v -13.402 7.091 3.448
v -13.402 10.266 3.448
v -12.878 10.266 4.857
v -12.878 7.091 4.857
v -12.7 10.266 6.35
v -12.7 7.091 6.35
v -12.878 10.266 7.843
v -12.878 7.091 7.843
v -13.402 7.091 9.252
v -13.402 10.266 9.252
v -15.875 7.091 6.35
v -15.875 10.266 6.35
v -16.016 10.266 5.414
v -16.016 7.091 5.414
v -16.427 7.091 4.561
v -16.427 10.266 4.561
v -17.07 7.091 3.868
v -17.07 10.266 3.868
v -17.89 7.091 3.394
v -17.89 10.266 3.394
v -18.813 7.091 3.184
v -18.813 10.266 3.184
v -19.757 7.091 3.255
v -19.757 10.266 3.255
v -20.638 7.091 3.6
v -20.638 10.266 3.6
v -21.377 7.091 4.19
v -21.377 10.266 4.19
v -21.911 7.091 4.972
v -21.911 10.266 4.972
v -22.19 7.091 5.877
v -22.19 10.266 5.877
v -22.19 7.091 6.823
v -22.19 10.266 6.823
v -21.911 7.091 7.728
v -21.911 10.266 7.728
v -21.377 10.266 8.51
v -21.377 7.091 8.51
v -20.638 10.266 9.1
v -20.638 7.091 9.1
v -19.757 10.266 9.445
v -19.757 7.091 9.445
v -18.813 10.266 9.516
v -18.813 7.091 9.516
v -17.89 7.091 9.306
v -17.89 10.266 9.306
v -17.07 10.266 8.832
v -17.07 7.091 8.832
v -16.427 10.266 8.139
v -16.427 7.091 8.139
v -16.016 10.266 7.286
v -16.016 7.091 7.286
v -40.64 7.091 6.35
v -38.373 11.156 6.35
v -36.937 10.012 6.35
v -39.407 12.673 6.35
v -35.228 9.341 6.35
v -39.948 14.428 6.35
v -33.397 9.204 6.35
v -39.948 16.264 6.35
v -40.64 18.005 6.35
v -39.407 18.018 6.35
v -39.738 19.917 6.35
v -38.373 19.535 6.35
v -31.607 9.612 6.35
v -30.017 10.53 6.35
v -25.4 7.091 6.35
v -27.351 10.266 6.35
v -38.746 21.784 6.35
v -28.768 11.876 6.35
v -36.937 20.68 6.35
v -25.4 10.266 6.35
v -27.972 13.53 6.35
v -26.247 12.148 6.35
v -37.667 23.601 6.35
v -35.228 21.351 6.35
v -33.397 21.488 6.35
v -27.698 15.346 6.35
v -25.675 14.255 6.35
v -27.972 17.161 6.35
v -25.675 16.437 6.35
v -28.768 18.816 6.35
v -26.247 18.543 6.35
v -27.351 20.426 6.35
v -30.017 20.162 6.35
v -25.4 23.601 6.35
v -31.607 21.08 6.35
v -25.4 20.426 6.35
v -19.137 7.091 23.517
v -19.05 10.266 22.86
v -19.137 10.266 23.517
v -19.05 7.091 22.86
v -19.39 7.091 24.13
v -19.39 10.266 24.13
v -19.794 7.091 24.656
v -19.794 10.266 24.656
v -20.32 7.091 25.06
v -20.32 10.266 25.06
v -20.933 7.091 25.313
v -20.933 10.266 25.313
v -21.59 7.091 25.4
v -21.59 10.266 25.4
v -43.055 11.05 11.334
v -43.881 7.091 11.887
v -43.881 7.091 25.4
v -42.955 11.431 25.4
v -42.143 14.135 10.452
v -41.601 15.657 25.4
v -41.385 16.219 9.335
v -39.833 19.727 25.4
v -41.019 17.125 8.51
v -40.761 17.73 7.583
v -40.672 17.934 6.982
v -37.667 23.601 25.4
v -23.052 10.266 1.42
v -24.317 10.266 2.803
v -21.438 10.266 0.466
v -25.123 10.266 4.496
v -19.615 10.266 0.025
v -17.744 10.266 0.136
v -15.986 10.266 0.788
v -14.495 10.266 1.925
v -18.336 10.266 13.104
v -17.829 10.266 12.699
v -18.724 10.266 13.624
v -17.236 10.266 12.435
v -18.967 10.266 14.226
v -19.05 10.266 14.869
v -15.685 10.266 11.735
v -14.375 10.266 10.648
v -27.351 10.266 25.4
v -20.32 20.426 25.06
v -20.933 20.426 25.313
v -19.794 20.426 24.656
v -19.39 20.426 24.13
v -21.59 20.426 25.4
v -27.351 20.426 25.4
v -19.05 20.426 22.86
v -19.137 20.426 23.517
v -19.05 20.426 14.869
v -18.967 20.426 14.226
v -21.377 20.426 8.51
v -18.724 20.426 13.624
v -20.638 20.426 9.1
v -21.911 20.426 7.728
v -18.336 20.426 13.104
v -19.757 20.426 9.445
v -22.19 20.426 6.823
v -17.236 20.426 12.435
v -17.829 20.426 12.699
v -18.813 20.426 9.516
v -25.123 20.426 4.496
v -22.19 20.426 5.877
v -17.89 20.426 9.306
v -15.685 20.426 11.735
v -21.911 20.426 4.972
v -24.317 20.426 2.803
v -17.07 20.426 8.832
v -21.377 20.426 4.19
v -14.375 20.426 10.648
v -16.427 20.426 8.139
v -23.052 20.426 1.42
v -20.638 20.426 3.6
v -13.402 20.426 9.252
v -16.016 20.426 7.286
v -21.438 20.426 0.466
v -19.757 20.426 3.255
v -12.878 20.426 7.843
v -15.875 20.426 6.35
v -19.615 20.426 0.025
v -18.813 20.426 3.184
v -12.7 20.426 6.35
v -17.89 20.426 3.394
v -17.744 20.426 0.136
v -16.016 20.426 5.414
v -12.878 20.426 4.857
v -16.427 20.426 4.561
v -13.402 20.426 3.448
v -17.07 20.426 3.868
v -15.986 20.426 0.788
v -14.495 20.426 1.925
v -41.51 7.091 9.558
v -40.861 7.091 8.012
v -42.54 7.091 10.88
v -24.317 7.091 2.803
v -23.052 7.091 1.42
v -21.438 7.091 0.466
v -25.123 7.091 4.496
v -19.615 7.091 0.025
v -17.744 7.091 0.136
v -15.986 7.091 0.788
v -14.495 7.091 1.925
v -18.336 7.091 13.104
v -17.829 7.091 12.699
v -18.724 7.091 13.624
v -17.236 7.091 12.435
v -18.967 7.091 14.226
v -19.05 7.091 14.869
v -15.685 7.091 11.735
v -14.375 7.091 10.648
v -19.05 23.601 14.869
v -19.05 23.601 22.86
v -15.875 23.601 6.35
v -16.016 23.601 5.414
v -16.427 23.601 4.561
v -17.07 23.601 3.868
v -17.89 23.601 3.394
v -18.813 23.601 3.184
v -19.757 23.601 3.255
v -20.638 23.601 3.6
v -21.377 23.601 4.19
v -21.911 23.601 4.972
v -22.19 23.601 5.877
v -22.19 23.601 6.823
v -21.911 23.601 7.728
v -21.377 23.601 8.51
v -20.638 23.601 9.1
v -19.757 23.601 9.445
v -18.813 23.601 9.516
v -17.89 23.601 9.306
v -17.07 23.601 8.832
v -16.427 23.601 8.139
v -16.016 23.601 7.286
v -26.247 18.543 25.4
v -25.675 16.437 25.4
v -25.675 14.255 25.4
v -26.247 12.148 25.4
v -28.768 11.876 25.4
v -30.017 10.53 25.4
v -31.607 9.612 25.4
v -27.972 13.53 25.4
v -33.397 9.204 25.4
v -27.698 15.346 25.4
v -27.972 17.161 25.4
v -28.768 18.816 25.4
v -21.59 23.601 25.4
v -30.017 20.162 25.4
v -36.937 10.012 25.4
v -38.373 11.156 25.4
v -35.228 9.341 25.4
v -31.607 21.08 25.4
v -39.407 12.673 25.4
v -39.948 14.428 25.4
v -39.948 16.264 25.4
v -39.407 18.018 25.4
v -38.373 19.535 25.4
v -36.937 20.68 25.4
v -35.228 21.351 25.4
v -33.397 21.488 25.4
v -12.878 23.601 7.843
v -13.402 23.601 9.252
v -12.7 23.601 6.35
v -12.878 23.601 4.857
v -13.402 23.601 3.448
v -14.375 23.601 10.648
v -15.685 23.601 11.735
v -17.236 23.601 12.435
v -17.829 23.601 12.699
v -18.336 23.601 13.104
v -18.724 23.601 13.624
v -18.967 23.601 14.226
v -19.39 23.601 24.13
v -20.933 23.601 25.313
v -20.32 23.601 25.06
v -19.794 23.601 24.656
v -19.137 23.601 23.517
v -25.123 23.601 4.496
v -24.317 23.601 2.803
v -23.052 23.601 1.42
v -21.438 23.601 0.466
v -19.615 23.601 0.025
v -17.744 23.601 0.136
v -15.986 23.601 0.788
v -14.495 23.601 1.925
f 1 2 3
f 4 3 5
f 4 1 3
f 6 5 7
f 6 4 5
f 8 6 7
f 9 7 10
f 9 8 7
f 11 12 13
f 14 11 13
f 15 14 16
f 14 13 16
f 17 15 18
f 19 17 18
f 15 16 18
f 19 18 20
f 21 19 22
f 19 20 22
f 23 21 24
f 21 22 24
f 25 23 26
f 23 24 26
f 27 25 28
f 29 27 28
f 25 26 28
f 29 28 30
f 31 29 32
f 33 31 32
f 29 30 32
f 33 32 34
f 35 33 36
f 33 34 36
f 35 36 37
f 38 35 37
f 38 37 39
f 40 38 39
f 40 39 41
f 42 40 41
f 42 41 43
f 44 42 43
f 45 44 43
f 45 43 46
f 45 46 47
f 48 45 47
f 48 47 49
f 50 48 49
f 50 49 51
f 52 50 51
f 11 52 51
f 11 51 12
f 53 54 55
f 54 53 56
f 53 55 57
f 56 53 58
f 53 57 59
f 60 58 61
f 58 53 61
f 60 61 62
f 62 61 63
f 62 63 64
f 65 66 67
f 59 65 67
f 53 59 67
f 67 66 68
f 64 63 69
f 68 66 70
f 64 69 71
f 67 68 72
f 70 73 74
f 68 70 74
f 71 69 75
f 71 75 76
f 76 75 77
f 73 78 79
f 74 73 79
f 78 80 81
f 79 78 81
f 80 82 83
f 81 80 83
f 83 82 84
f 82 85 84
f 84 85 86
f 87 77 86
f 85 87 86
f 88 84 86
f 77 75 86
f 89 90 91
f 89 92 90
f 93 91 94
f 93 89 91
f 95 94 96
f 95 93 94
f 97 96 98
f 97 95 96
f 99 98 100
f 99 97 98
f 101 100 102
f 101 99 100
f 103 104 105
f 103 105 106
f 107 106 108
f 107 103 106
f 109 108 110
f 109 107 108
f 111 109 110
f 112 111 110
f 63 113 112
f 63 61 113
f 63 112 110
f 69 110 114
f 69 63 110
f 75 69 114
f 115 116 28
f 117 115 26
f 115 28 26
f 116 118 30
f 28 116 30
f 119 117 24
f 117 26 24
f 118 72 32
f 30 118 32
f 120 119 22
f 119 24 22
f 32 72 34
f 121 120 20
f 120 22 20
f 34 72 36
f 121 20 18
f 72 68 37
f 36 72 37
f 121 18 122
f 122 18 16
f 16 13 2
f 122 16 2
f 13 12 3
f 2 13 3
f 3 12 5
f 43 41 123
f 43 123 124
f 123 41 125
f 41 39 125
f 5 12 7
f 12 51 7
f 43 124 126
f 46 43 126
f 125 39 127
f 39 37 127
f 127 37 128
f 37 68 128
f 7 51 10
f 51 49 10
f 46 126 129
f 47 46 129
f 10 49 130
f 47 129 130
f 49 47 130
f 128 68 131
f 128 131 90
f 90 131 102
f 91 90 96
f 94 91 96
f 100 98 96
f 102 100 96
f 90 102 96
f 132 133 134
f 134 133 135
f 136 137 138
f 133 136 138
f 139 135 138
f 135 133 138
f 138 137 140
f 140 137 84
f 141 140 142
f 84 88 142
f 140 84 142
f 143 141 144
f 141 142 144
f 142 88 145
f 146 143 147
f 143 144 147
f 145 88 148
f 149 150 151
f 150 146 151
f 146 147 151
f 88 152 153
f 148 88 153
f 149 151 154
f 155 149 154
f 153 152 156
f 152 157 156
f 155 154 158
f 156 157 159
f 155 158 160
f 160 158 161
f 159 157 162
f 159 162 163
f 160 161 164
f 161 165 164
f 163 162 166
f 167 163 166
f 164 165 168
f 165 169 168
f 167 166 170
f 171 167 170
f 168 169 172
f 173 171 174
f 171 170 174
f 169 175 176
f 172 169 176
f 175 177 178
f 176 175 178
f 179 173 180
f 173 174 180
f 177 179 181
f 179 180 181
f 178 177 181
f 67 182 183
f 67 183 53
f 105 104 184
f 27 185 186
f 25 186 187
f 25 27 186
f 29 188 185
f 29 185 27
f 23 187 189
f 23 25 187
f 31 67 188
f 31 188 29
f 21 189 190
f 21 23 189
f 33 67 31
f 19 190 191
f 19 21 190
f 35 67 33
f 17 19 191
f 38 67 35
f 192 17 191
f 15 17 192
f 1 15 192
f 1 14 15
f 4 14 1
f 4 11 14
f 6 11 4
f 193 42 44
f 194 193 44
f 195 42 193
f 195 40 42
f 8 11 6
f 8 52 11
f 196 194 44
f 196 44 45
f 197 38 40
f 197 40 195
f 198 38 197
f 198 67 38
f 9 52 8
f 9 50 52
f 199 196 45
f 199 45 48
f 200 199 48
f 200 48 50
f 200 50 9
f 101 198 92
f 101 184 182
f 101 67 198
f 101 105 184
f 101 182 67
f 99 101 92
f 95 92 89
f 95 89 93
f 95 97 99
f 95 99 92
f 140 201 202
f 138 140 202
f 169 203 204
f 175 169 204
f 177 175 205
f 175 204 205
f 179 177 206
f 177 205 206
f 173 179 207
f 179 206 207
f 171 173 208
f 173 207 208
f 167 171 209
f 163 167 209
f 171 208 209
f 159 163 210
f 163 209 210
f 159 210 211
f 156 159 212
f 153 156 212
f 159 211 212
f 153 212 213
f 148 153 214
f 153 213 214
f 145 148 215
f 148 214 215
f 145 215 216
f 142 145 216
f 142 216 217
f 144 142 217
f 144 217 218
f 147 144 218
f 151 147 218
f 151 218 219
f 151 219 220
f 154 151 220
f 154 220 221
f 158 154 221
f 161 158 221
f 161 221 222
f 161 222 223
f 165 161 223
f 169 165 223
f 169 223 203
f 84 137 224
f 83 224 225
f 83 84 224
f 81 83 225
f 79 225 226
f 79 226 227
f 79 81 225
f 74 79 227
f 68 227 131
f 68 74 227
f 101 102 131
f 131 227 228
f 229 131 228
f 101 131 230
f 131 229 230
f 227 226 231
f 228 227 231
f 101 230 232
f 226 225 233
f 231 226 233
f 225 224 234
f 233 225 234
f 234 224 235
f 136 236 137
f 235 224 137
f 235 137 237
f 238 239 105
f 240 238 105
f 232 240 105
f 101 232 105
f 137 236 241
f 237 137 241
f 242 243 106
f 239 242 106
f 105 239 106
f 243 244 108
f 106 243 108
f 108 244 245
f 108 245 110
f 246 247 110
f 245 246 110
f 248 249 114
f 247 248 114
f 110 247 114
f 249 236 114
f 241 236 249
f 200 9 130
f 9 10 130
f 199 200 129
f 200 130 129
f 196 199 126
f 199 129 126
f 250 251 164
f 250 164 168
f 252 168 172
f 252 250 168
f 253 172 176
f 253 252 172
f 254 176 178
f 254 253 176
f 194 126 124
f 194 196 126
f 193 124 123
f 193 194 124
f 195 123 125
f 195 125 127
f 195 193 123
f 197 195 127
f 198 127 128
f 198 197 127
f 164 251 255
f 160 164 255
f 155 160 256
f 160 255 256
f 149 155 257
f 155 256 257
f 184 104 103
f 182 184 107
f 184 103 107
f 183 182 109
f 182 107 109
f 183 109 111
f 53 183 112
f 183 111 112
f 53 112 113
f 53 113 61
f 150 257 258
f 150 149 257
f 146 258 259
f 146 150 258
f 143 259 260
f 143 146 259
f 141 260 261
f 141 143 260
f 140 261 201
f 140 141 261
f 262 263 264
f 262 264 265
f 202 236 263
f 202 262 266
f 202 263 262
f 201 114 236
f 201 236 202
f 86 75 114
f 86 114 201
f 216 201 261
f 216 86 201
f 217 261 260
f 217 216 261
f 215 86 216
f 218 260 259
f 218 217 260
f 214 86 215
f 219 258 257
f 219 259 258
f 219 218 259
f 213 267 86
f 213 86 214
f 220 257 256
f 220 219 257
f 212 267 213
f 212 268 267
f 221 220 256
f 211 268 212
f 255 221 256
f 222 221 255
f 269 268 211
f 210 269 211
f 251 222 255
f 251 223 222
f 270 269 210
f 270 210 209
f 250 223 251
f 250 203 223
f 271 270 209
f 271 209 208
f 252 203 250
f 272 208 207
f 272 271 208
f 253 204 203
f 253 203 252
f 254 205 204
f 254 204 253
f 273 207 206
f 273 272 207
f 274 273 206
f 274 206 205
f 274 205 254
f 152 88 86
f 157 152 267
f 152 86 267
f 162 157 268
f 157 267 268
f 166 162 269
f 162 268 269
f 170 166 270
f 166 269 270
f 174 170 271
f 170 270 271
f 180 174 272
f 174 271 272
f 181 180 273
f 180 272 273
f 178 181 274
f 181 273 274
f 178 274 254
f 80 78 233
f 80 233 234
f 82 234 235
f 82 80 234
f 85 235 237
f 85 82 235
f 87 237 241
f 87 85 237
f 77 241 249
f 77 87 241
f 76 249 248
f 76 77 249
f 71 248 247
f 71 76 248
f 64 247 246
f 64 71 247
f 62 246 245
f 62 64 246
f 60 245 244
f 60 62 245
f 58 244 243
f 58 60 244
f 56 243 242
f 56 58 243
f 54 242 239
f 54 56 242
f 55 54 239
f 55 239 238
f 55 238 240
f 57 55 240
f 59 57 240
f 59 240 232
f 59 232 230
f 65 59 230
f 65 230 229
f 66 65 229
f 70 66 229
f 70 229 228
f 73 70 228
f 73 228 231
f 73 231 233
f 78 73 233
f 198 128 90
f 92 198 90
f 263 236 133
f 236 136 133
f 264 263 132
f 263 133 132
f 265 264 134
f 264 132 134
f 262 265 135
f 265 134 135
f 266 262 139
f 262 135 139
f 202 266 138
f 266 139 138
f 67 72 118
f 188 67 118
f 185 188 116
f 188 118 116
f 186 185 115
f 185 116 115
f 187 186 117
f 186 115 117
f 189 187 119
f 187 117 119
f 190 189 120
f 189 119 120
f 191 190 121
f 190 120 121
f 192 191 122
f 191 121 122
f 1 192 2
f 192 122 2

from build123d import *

# Parameters (mm, degrees)
SKETCH2_R           = 6.1595
BOSS_EXTRUDE1_DEPTH = 25.4
SKETCH3_R           = 3.175
CUT_EXTRUDE1_DEPTH  = 25.4
CUT_EXTRUDE2_DEPTH  = 17.51
SKETCH7_R           = 6.35
SKETCH7_R_2         = 3.175
BOSS_EXTRUDE2_DEPTH = 3.175
SKETCH8_R           = 6.35
SKETCH8_R_2         = 3.175
BOSS_EXTRUDE3_DEPTH = 3.175
FILLET1_R           = 2.54
FILLET2_R           = 2.54


with BuildPart() as part:
    # Sketch2 → Boss-Extrude1 (new body)
    with BuildSketch(Plane.XY):
        with BuildLine():
            Line((-37.667011981, 23.60082008), (-13.401813639, 23.60082008))
            Line((-13.401813639, 23.60082008), (-13.401813639, 20.42582008))
            Line((-13.401813639, 20.42582008), (-27.350622089, 20.42582008))
            ThreePointArc((-27.350622089, 20.42582008), (-25.602435825, 15.34582008), (-27.350622089, 10.26582008))
            Line((-27.350622089, 10.26582008), (-13.401813639, 10.26582008))
            Line((-13.401813639, 10.26582008), (-13.401813639, 7.09082008))
            Line((-13.401813639, 7.09082008), (-43.880779056, 7.09082008))
            ThreePointArc((-43.880779056, 7.09082008), (-41.601148791, 15.657168302), (-37.667011981, 23.60082008))
        make_face()
        with Locations((-33.857435825, 15.34582008)):
            Circle(SKETCH2_R, mode=Mode.SUBTRACT)
    extrude(amount=BOSS_EXTRUDE1_DEPTH)

    # Sketch3 → Cut-Extrude1 (cut)
    with BuildSketch(Plane(origin=(0, 23.60082008, 0), x_dir=(1, 0, 0), z_dir=(0, 1, 0))):
        with Locations((-19.05, -6.35)):
            Circle(SKETCH3_R)
    extrude(amount=-CUT_EXTRUDE1_DEPTH, mode=Mode.SUBTRACT)

    # Sketch6 → Cut-Extrude2 (cut, through all)
    with BuildSketch(Plane(origin=(0, 23.60082008, 0), x_dir=(1, 0, 0), z_dir=(0, 1, 0))):
        with BuildLine():
            Line((-40.64, 0), (-46.99, 0))
            ThreePointArc((-46.99, 0), (-51.480128061, -10.840128061), (-40.64, -6.35))
            Line((-40.64, -6.35), (-25.4, -6.35))
            ThreePointArc((-25.4, -6.35), (-14.559871939, -1.859871939), (-19.05, -12.7))
            Line((-19.05, -12.7), (-19.05, -25.4))
            Line((-19.05, -25.4), (-13.401813639, -25.4))
            Line((-13.401813639, -25.4), (-10.329666698, -21.085123092))
            Line((-10.329666698, -21.085123092), (-9.028029261, 2.468316234))
            Line((-9.028029261, 2.468316234), (-25.4, 3.088143584))
            Line((-25.4, 3.088143584), (-40.64, 0))
        make_face()
    extrude(amount=-CUT_EXTRUDE2_DEPTH, mode=Mode.SUBTRACT)

    # Sketch7 → Boss-Extrude2 (add)
    with BuildSketch(Plane(origin=(0, 23.60082008, 0), x_dir=(1, 0, 0), z_dir=(0, 1, 0))):
        with Locations((-19.05, -6.35)):
            Circle(SKETCH7_R)
        with Locations((-19.05, -6.35)):
            Circle(SKETCH7_R_2, mode=Mode.SUBTRACT)
    extrude(amount=-BOSS_EXTRUDE2_DEPTH)

    # Sketch8 → Boss-Extrude3 (add)
    with BuildSketch(Plane.XZ.offset(-7.09082008)):
        with Locations((-19.05, 6.35)):
            Circle(SKETCH8_R)
        with Locations((-19.05, 6.35)):
            Circle(SKETCH8_R_2, mode=Mode.SUBTRACT)
    extrude(amount=-BOSS_EXTRUDE3_DEPTH)

    # Fillet1
    fillet1_edges = [part.edges().sort_by_distance(p)[0] for p in [
        (-19.05, 22.01332008, 12.7),
        (-19.05, 8.67832008, 12.7),
    ]]
    fillet(fillet1_edges, radius=FILLET1_R)

    # Fillet2
    fillet2_edges = [part.edges().sort_by_distance(p)[0] for p in [
        (-19.05, 22.01332008, 25.4),
        (-19.05, 8.67832008, 25.4),
    ]]
    fillet(fillet2_edges, radius=FILLET2_R)


solid = part.part
